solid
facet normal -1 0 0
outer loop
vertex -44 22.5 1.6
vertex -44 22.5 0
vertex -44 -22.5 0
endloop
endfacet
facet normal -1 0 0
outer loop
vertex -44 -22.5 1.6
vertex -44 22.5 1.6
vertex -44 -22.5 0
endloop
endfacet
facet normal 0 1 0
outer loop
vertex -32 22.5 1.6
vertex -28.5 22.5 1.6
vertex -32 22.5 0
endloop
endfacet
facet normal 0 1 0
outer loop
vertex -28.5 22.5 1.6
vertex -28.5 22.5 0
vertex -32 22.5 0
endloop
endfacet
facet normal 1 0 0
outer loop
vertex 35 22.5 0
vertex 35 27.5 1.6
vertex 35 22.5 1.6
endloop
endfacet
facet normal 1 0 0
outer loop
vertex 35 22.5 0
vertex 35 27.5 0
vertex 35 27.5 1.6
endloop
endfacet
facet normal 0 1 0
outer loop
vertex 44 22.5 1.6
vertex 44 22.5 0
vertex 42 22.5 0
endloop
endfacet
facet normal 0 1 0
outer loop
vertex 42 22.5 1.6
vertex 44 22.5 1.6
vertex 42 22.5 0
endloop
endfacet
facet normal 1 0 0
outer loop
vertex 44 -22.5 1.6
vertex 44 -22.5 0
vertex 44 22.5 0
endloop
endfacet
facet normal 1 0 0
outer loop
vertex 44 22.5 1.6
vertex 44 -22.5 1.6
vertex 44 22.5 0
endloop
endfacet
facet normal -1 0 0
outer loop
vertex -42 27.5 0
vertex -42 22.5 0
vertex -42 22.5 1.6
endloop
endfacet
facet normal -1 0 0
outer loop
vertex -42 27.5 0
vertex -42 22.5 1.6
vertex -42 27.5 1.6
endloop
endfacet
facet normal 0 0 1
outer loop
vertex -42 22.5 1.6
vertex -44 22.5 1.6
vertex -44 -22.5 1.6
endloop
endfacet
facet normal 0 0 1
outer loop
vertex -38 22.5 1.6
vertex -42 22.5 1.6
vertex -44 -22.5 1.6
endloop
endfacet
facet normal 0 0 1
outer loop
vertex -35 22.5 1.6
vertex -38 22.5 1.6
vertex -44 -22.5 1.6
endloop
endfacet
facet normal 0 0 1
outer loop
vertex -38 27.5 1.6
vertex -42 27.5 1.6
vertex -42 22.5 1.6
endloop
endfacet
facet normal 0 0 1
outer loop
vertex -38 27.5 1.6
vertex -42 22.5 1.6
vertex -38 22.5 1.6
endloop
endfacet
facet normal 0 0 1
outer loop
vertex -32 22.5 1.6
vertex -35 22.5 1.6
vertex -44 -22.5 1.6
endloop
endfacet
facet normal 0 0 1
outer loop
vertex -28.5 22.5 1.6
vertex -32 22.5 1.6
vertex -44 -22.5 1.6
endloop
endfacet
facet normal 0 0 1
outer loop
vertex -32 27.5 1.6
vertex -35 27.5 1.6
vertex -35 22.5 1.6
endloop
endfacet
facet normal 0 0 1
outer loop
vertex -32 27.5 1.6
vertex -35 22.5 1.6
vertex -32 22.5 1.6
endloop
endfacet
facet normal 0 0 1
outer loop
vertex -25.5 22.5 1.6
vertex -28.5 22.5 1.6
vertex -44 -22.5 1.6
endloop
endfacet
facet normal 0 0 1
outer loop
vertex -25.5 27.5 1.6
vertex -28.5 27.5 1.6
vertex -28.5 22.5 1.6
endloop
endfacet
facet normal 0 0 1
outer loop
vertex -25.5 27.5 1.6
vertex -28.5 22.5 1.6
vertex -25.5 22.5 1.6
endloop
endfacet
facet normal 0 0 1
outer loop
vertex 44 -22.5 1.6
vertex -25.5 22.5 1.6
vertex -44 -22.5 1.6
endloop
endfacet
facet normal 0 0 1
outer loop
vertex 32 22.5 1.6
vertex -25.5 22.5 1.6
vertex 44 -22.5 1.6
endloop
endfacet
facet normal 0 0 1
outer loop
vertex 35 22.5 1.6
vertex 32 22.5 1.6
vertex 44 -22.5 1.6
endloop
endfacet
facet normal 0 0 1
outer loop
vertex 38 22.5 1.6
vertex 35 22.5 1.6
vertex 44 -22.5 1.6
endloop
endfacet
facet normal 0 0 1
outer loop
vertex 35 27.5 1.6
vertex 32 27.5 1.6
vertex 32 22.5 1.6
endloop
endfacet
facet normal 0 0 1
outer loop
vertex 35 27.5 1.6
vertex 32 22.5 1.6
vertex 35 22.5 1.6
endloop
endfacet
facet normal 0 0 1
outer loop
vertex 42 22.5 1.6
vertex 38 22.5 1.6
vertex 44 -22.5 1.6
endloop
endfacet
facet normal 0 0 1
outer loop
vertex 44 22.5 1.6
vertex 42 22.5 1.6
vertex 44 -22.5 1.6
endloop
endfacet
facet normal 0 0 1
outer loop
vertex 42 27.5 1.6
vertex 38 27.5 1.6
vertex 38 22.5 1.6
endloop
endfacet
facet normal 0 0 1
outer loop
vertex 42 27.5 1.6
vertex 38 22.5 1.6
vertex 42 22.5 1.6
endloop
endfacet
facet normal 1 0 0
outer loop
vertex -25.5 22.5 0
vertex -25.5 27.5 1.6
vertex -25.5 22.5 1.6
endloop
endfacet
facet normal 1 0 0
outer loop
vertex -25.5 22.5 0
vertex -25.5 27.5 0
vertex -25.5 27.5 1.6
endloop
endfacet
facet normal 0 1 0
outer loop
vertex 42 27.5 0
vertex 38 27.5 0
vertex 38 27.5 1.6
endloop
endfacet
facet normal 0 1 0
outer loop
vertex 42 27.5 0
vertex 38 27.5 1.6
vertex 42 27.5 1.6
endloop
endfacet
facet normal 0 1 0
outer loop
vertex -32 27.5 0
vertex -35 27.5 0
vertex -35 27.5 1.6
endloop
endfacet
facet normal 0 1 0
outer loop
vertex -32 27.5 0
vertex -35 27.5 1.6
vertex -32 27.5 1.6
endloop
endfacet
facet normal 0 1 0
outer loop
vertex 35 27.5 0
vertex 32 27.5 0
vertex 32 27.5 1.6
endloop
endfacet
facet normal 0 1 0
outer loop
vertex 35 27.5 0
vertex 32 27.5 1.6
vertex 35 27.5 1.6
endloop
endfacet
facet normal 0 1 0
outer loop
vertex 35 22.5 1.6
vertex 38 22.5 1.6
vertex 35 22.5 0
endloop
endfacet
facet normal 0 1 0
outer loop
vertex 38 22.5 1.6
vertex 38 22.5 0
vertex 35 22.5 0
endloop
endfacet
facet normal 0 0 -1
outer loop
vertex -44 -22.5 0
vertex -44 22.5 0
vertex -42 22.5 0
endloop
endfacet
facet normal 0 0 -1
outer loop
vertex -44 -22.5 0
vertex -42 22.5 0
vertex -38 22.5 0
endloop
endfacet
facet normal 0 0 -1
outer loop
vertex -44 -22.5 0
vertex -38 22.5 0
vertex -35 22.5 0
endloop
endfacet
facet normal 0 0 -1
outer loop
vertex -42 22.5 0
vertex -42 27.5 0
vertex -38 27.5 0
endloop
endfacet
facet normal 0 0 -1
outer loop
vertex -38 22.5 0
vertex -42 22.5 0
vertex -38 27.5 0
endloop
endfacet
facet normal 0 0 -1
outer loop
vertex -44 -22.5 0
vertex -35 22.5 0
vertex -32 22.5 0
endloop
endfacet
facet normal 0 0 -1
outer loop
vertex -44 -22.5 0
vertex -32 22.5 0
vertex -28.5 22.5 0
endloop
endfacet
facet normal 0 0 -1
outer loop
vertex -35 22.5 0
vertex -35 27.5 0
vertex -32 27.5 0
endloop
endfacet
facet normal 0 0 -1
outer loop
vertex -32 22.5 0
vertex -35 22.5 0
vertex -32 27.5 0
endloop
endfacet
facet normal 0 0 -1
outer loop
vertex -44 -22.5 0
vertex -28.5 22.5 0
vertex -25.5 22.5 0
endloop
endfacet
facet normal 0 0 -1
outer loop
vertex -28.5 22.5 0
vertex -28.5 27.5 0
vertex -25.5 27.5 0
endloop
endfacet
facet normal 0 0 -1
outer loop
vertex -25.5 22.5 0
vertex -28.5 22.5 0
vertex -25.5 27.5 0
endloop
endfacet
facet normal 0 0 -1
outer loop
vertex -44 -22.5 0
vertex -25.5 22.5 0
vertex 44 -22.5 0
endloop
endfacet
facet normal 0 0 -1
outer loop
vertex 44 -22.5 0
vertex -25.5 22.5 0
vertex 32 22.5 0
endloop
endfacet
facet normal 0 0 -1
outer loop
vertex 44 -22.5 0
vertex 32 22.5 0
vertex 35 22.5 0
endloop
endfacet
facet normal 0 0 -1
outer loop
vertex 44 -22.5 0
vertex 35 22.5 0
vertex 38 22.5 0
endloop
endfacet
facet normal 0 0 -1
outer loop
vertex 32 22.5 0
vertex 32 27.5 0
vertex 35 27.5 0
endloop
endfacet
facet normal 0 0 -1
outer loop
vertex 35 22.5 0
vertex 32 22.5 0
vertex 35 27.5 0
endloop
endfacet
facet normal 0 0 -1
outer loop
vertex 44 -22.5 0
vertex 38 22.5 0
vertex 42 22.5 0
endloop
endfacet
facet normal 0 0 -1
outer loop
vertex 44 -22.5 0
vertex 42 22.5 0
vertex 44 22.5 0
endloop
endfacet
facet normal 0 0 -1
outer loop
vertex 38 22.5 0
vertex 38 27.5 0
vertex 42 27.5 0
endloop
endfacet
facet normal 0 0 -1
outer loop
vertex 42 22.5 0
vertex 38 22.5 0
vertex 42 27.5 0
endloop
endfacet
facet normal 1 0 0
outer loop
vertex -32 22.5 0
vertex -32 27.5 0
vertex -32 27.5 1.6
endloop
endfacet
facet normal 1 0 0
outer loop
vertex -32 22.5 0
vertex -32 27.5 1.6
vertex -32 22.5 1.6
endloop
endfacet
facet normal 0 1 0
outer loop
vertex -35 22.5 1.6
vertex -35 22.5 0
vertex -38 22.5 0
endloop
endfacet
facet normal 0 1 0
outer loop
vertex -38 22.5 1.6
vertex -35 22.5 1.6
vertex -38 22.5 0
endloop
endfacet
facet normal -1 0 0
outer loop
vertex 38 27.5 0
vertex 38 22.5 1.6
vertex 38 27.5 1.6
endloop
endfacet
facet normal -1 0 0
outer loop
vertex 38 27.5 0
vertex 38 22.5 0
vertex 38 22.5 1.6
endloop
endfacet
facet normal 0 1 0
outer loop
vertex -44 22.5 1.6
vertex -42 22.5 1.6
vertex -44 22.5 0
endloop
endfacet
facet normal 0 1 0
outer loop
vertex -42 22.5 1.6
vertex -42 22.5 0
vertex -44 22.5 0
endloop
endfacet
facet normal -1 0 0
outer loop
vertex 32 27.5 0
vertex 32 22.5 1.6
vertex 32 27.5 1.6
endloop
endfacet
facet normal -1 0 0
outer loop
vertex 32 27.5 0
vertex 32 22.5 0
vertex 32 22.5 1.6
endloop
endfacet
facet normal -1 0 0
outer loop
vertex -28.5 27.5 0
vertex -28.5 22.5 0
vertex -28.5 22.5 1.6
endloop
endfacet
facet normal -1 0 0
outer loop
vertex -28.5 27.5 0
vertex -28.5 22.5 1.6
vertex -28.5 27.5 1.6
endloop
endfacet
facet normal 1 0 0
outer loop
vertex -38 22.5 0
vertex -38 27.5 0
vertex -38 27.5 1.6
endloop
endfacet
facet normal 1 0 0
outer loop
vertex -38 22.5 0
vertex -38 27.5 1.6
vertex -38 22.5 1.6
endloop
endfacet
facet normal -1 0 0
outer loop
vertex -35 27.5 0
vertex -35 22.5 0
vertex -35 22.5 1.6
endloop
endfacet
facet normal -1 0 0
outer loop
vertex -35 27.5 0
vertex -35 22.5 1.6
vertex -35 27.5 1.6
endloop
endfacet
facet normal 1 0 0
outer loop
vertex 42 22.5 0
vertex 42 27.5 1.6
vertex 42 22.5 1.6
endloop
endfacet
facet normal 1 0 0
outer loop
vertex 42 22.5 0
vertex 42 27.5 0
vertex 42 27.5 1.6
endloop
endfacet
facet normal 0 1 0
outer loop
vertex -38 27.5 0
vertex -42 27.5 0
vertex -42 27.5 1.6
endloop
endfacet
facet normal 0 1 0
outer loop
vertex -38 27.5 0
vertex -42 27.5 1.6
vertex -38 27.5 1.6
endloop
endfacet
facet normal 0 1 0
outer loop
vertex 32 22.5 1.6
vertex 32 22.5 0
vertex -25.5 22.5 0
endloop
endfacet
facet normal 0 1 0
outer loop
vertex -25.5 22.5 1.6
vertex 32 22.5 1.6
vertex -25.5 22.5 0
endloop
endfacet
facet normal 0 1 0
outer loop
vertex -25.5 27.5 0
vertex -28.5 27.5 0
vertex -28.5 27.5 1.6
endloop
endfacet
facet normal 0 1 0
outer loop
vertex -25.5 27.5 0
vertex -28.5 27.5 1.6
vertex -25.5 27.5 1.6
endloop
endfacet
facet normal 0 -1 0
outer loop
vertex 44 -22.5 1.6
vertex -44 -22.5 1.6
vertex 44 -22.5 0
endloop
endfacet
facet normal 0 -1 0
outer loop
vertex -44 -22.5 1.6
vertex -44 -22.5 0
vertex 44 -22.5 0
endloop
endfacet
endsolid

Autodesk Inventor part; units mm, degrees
ref_plane "YZ Plane" through (0, 0, 0) normal (1, 0, 0) x (0, 1, 0)
ref_plane "XZ Plane" through (0, 0, 0) normal (0, 1, 0) x (-1, 0, 0)
ref_plane "XY Plane" through (0, 0, 0) normal (0, 0, 1) x (1, 0, 0)
sketch "Sketch1" plane through (0, 0, 0) normal (0, 0, 1) x (1, 0, 0)
  line L0 (-44, -22.5) -> (44, -22.5)
  line L1 (44, -22.5) -> (44, 22.5)
  line L2 (44, 22.5) -> (-44, 22.5)
  line L3 (-44, 22.5) -> (-44, -22.5)
  line L4 (-44, -22.5) -> (44, 22.5) construction
  line L5 (44, -22.5) -> (-44, 22.5) construction
  line L6 (-42, 22.5) -> (-42, 27.5)
  line L7 (-42, 27.5) -> (-38, 27.5)
  line L8 (-38, 27.5) -> (-38, 22.5)
  line L9 (-35, 22.5) -> (-35, 27.5)
  line L10 (-35, 27.5) -> (-32, 27.5)
  line L11 (-32, 27.5) -> (-32, 22.5)
  line L12 (-28.5, 22.5) -> (-28.5, 27.5)
  line L13 (-28.5, 27.5) -> (-25.5, 27.5)
  line L14 (-25.5, 27.5) -> (-25.5, 22.5)
  line L15 (32, 22.5) -> (32, 27.5)
  line L16 (32, 27.5) -> (35, 27.5)
  line L17 (35, 27.5) -> (35, 22.5)
  line L18 (38, 22.5) -> (38, 27.5)
  line L19 (38, 27.5) -> (42, 27.5)
  line L20 (42, 27.5) -> (42, 22.5)
  point P0 (0, 0)
  point P1 (-28.5, 25)
  point P2 (-40, 27.5)
  dimension "d0" = 45
  dimension "d1" = 88
  dimension "d2" = 4
  dimension "d3" = 3
  dimension "d4" = 3
  dimension "d5" = 3
  dimension "d6" = 4
  dimension "d7" = 2
  dimension "d8" = 3
  dimension "d9" = 3.5
  dimension "d10" = 2
  dimension "d11" = 3
  dimension "d12" = 5
extrude "Extrusion1" add sketch "Sketch1" along normal blind 1.6
properties part number "PCB_2"
